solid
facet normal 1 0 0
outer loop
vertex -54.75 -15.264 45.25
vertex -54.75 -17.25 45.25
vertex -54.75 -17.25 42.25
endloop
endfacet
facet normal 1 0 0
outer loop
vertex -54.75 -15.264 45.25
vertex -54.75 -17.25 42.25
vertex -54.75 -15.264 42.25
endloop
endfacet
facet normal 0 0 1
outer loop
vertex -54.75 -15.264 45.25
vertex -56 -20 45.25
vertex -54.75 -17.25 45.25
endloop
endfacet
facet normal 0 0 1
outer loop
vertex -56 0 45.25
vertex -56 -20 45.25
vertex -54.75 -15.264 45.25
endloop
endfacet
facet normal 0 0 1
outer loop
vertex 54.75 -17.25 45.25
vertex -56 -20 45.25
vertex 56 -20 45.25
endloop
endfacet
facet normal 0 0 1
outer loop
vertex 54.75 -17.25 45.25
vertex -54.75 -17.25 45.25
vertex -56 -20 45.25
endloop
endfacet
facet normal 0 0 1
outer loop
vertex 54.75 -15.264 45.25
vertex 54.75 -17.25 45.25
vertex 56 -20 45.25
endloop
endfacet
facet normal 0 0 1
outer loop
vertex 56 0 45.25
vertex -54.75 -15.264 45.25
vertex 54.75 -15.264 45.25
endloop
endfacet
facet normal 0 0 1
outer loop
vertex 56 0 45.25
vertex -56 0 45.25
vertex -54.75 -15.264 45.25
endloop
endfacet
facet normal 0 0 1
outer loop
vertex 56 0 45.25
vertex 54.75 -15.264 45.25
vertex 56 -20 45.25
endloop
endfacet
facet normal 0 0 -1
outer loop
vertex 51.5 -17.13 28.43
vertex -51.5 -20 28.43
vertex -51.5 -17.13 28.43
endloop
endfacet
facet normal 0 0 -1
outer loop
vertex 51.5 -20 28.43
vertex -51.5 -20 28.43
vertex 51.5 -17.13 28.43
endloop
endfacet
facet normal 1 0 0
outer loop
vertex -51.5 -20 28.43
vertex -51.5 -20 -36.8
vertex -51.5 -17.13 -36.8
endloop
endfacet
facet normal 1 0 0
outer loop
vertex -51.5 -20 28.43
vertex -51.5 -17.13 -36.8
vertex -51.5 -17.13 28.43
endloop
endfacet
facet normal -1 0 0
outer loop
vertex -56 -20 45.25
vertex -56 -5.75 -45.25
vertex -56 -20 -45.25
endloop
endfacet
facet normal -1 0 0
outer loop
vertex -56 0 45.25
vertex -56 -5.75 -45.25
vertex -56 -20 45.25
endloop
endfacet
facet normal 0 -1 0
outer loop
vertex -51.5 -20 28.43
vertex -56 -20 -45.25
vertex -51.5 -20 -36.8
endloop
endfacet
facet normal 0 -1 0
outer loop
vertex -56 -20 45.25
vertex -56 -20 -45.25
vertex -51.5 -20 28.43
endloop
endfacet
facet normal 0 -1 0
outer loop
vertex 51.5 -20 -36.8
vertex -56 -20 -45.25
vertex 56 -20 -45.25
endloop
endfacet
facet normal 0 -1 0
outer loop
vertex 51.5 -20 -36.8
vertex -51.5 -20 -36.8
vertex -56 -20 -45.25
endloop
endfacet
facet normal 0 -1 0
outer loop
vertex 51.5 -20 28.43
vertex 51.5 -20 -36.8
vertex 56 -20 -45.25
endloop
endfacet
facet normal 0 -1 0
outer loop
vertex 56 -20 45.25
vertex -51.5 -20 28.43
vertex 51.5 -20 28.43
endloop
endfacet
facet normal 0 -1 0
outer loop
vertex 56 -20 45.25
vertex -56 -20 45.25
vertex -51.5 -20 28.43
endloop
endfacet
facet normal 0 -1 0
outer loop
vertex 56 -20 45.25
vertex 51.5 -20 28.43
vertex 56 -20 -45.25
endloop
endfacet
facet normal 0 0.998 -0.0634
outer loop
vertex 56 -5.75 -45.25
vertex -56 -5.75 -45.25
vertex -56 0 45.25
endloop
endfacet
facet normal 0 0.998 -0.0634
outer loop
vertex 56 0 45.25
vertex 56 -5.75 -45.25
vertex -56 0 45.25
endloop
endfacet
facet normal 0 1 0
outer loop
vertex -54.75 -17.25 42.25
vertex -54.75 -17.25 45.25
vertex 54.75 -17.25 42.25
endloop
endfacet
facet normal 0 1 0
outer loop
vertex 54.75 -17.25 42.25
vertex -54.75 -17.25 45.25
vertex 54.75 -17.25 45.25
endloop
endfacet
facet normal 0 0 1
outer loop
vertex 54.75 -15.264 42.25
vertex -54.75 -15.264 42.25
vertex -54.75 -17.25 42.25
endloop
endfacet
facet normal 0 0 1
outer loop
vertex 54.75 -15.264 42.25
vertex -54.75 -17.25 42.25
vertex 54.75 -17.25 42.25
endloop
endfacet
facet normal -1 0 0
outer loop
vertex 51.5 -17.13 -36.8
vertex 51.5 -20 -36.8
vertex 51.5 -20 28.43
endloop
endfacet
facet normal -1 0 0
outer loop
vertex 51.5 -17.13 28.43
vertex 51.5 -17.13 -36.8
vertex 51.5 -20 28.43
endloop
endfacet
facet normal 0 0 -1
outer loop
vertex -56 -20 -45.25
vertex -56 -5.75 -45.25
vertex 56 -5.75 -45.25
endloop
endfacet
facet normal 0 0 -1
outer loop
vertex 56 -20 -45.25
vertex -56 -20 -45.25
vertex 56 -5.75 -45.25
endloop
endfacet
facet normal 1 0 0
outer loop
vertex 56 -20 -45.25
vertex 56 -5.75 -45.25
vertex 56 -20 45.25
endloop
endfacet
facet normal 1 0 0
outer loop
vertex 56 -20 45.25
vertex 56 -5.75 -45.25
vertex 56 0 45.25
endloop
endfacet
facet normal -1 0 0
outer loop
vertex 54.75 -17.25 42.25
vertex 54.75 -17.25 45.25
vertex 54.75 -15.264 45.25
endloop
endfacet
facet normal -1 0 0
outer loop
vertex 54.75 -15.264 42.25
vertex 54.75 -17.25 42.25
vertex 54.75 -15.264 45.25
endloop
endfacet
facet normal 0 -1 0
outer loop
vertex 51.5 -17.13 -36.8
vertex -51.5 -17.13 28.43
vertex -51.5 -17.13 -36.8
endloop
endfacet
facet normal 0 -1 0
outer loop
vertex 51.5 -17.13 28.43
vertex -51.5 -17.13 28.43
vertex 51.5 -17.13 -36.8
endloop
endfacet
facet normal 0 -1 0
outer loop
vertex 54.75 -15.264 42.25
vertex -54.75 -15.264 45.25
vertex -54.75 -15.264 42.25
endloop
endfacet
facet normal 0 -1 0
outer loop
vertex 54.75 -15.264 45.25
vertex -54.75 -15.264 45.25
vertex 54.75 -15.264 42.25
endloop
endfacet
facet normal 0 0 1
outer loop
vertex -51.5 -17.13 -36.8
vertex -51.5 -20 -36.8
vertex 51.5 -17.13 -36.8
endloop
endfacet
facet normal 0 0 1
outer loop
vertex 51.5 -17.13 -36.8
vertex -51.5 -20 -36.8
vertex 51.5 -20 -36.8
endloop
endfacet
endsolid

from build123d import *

# Parameters (mm, degrees)
F0_W     = 112
F0_H     = 90.5
F1_DEPTH = 20
F3_DEPTH = 200
F4_W     = 103
F4_H     = 65.23
F5_DEPTH = 2.87
F6_W     = 109.5
F6_H     = 1.985677
F7_DEPTH = 3


with BuildPart() as f1:
    # F0 (on Front) → F1 (new body)
    with BuildSketch(Plane.XZ):
        Rectangle(F0_W, F0_H)
    extrude(amount=F1_DEPTH)

    # F2 (on face) → F3 (cut)
    with BuildSketch(Plane(origin=(-56, 0, 0), x_dir=(0, -1, 0), z_dir=(-1, 0, 0))):
        Polygon((5.75, -45.25), (0, 45.25), (0, -45.25), align=None)
    extrude(amount=-F3_DEPTH, mode=Mode.SUBTRACT)

    # F4 (on face) → F5 (cut)
    with BuildSketch(Plane.XZ.offset(20)):
        with Locations((0, -4.185)):
            Rectangle(F4_W, F4_H)
    extrude(amount=-F5_DEPTH, mode=Mode.SUBTRACT)

    # F6 (on face) → F7 (cut)
    with BuildSketch(Plane.XY.offset(45.25)):
        with Locations((0, -16.257161)):
            Rectangle(F6_W, F6_H)
    extrude(amount=-F7_DEPTH, mode=Mode.SUBTRACT)


solid = f1.part
